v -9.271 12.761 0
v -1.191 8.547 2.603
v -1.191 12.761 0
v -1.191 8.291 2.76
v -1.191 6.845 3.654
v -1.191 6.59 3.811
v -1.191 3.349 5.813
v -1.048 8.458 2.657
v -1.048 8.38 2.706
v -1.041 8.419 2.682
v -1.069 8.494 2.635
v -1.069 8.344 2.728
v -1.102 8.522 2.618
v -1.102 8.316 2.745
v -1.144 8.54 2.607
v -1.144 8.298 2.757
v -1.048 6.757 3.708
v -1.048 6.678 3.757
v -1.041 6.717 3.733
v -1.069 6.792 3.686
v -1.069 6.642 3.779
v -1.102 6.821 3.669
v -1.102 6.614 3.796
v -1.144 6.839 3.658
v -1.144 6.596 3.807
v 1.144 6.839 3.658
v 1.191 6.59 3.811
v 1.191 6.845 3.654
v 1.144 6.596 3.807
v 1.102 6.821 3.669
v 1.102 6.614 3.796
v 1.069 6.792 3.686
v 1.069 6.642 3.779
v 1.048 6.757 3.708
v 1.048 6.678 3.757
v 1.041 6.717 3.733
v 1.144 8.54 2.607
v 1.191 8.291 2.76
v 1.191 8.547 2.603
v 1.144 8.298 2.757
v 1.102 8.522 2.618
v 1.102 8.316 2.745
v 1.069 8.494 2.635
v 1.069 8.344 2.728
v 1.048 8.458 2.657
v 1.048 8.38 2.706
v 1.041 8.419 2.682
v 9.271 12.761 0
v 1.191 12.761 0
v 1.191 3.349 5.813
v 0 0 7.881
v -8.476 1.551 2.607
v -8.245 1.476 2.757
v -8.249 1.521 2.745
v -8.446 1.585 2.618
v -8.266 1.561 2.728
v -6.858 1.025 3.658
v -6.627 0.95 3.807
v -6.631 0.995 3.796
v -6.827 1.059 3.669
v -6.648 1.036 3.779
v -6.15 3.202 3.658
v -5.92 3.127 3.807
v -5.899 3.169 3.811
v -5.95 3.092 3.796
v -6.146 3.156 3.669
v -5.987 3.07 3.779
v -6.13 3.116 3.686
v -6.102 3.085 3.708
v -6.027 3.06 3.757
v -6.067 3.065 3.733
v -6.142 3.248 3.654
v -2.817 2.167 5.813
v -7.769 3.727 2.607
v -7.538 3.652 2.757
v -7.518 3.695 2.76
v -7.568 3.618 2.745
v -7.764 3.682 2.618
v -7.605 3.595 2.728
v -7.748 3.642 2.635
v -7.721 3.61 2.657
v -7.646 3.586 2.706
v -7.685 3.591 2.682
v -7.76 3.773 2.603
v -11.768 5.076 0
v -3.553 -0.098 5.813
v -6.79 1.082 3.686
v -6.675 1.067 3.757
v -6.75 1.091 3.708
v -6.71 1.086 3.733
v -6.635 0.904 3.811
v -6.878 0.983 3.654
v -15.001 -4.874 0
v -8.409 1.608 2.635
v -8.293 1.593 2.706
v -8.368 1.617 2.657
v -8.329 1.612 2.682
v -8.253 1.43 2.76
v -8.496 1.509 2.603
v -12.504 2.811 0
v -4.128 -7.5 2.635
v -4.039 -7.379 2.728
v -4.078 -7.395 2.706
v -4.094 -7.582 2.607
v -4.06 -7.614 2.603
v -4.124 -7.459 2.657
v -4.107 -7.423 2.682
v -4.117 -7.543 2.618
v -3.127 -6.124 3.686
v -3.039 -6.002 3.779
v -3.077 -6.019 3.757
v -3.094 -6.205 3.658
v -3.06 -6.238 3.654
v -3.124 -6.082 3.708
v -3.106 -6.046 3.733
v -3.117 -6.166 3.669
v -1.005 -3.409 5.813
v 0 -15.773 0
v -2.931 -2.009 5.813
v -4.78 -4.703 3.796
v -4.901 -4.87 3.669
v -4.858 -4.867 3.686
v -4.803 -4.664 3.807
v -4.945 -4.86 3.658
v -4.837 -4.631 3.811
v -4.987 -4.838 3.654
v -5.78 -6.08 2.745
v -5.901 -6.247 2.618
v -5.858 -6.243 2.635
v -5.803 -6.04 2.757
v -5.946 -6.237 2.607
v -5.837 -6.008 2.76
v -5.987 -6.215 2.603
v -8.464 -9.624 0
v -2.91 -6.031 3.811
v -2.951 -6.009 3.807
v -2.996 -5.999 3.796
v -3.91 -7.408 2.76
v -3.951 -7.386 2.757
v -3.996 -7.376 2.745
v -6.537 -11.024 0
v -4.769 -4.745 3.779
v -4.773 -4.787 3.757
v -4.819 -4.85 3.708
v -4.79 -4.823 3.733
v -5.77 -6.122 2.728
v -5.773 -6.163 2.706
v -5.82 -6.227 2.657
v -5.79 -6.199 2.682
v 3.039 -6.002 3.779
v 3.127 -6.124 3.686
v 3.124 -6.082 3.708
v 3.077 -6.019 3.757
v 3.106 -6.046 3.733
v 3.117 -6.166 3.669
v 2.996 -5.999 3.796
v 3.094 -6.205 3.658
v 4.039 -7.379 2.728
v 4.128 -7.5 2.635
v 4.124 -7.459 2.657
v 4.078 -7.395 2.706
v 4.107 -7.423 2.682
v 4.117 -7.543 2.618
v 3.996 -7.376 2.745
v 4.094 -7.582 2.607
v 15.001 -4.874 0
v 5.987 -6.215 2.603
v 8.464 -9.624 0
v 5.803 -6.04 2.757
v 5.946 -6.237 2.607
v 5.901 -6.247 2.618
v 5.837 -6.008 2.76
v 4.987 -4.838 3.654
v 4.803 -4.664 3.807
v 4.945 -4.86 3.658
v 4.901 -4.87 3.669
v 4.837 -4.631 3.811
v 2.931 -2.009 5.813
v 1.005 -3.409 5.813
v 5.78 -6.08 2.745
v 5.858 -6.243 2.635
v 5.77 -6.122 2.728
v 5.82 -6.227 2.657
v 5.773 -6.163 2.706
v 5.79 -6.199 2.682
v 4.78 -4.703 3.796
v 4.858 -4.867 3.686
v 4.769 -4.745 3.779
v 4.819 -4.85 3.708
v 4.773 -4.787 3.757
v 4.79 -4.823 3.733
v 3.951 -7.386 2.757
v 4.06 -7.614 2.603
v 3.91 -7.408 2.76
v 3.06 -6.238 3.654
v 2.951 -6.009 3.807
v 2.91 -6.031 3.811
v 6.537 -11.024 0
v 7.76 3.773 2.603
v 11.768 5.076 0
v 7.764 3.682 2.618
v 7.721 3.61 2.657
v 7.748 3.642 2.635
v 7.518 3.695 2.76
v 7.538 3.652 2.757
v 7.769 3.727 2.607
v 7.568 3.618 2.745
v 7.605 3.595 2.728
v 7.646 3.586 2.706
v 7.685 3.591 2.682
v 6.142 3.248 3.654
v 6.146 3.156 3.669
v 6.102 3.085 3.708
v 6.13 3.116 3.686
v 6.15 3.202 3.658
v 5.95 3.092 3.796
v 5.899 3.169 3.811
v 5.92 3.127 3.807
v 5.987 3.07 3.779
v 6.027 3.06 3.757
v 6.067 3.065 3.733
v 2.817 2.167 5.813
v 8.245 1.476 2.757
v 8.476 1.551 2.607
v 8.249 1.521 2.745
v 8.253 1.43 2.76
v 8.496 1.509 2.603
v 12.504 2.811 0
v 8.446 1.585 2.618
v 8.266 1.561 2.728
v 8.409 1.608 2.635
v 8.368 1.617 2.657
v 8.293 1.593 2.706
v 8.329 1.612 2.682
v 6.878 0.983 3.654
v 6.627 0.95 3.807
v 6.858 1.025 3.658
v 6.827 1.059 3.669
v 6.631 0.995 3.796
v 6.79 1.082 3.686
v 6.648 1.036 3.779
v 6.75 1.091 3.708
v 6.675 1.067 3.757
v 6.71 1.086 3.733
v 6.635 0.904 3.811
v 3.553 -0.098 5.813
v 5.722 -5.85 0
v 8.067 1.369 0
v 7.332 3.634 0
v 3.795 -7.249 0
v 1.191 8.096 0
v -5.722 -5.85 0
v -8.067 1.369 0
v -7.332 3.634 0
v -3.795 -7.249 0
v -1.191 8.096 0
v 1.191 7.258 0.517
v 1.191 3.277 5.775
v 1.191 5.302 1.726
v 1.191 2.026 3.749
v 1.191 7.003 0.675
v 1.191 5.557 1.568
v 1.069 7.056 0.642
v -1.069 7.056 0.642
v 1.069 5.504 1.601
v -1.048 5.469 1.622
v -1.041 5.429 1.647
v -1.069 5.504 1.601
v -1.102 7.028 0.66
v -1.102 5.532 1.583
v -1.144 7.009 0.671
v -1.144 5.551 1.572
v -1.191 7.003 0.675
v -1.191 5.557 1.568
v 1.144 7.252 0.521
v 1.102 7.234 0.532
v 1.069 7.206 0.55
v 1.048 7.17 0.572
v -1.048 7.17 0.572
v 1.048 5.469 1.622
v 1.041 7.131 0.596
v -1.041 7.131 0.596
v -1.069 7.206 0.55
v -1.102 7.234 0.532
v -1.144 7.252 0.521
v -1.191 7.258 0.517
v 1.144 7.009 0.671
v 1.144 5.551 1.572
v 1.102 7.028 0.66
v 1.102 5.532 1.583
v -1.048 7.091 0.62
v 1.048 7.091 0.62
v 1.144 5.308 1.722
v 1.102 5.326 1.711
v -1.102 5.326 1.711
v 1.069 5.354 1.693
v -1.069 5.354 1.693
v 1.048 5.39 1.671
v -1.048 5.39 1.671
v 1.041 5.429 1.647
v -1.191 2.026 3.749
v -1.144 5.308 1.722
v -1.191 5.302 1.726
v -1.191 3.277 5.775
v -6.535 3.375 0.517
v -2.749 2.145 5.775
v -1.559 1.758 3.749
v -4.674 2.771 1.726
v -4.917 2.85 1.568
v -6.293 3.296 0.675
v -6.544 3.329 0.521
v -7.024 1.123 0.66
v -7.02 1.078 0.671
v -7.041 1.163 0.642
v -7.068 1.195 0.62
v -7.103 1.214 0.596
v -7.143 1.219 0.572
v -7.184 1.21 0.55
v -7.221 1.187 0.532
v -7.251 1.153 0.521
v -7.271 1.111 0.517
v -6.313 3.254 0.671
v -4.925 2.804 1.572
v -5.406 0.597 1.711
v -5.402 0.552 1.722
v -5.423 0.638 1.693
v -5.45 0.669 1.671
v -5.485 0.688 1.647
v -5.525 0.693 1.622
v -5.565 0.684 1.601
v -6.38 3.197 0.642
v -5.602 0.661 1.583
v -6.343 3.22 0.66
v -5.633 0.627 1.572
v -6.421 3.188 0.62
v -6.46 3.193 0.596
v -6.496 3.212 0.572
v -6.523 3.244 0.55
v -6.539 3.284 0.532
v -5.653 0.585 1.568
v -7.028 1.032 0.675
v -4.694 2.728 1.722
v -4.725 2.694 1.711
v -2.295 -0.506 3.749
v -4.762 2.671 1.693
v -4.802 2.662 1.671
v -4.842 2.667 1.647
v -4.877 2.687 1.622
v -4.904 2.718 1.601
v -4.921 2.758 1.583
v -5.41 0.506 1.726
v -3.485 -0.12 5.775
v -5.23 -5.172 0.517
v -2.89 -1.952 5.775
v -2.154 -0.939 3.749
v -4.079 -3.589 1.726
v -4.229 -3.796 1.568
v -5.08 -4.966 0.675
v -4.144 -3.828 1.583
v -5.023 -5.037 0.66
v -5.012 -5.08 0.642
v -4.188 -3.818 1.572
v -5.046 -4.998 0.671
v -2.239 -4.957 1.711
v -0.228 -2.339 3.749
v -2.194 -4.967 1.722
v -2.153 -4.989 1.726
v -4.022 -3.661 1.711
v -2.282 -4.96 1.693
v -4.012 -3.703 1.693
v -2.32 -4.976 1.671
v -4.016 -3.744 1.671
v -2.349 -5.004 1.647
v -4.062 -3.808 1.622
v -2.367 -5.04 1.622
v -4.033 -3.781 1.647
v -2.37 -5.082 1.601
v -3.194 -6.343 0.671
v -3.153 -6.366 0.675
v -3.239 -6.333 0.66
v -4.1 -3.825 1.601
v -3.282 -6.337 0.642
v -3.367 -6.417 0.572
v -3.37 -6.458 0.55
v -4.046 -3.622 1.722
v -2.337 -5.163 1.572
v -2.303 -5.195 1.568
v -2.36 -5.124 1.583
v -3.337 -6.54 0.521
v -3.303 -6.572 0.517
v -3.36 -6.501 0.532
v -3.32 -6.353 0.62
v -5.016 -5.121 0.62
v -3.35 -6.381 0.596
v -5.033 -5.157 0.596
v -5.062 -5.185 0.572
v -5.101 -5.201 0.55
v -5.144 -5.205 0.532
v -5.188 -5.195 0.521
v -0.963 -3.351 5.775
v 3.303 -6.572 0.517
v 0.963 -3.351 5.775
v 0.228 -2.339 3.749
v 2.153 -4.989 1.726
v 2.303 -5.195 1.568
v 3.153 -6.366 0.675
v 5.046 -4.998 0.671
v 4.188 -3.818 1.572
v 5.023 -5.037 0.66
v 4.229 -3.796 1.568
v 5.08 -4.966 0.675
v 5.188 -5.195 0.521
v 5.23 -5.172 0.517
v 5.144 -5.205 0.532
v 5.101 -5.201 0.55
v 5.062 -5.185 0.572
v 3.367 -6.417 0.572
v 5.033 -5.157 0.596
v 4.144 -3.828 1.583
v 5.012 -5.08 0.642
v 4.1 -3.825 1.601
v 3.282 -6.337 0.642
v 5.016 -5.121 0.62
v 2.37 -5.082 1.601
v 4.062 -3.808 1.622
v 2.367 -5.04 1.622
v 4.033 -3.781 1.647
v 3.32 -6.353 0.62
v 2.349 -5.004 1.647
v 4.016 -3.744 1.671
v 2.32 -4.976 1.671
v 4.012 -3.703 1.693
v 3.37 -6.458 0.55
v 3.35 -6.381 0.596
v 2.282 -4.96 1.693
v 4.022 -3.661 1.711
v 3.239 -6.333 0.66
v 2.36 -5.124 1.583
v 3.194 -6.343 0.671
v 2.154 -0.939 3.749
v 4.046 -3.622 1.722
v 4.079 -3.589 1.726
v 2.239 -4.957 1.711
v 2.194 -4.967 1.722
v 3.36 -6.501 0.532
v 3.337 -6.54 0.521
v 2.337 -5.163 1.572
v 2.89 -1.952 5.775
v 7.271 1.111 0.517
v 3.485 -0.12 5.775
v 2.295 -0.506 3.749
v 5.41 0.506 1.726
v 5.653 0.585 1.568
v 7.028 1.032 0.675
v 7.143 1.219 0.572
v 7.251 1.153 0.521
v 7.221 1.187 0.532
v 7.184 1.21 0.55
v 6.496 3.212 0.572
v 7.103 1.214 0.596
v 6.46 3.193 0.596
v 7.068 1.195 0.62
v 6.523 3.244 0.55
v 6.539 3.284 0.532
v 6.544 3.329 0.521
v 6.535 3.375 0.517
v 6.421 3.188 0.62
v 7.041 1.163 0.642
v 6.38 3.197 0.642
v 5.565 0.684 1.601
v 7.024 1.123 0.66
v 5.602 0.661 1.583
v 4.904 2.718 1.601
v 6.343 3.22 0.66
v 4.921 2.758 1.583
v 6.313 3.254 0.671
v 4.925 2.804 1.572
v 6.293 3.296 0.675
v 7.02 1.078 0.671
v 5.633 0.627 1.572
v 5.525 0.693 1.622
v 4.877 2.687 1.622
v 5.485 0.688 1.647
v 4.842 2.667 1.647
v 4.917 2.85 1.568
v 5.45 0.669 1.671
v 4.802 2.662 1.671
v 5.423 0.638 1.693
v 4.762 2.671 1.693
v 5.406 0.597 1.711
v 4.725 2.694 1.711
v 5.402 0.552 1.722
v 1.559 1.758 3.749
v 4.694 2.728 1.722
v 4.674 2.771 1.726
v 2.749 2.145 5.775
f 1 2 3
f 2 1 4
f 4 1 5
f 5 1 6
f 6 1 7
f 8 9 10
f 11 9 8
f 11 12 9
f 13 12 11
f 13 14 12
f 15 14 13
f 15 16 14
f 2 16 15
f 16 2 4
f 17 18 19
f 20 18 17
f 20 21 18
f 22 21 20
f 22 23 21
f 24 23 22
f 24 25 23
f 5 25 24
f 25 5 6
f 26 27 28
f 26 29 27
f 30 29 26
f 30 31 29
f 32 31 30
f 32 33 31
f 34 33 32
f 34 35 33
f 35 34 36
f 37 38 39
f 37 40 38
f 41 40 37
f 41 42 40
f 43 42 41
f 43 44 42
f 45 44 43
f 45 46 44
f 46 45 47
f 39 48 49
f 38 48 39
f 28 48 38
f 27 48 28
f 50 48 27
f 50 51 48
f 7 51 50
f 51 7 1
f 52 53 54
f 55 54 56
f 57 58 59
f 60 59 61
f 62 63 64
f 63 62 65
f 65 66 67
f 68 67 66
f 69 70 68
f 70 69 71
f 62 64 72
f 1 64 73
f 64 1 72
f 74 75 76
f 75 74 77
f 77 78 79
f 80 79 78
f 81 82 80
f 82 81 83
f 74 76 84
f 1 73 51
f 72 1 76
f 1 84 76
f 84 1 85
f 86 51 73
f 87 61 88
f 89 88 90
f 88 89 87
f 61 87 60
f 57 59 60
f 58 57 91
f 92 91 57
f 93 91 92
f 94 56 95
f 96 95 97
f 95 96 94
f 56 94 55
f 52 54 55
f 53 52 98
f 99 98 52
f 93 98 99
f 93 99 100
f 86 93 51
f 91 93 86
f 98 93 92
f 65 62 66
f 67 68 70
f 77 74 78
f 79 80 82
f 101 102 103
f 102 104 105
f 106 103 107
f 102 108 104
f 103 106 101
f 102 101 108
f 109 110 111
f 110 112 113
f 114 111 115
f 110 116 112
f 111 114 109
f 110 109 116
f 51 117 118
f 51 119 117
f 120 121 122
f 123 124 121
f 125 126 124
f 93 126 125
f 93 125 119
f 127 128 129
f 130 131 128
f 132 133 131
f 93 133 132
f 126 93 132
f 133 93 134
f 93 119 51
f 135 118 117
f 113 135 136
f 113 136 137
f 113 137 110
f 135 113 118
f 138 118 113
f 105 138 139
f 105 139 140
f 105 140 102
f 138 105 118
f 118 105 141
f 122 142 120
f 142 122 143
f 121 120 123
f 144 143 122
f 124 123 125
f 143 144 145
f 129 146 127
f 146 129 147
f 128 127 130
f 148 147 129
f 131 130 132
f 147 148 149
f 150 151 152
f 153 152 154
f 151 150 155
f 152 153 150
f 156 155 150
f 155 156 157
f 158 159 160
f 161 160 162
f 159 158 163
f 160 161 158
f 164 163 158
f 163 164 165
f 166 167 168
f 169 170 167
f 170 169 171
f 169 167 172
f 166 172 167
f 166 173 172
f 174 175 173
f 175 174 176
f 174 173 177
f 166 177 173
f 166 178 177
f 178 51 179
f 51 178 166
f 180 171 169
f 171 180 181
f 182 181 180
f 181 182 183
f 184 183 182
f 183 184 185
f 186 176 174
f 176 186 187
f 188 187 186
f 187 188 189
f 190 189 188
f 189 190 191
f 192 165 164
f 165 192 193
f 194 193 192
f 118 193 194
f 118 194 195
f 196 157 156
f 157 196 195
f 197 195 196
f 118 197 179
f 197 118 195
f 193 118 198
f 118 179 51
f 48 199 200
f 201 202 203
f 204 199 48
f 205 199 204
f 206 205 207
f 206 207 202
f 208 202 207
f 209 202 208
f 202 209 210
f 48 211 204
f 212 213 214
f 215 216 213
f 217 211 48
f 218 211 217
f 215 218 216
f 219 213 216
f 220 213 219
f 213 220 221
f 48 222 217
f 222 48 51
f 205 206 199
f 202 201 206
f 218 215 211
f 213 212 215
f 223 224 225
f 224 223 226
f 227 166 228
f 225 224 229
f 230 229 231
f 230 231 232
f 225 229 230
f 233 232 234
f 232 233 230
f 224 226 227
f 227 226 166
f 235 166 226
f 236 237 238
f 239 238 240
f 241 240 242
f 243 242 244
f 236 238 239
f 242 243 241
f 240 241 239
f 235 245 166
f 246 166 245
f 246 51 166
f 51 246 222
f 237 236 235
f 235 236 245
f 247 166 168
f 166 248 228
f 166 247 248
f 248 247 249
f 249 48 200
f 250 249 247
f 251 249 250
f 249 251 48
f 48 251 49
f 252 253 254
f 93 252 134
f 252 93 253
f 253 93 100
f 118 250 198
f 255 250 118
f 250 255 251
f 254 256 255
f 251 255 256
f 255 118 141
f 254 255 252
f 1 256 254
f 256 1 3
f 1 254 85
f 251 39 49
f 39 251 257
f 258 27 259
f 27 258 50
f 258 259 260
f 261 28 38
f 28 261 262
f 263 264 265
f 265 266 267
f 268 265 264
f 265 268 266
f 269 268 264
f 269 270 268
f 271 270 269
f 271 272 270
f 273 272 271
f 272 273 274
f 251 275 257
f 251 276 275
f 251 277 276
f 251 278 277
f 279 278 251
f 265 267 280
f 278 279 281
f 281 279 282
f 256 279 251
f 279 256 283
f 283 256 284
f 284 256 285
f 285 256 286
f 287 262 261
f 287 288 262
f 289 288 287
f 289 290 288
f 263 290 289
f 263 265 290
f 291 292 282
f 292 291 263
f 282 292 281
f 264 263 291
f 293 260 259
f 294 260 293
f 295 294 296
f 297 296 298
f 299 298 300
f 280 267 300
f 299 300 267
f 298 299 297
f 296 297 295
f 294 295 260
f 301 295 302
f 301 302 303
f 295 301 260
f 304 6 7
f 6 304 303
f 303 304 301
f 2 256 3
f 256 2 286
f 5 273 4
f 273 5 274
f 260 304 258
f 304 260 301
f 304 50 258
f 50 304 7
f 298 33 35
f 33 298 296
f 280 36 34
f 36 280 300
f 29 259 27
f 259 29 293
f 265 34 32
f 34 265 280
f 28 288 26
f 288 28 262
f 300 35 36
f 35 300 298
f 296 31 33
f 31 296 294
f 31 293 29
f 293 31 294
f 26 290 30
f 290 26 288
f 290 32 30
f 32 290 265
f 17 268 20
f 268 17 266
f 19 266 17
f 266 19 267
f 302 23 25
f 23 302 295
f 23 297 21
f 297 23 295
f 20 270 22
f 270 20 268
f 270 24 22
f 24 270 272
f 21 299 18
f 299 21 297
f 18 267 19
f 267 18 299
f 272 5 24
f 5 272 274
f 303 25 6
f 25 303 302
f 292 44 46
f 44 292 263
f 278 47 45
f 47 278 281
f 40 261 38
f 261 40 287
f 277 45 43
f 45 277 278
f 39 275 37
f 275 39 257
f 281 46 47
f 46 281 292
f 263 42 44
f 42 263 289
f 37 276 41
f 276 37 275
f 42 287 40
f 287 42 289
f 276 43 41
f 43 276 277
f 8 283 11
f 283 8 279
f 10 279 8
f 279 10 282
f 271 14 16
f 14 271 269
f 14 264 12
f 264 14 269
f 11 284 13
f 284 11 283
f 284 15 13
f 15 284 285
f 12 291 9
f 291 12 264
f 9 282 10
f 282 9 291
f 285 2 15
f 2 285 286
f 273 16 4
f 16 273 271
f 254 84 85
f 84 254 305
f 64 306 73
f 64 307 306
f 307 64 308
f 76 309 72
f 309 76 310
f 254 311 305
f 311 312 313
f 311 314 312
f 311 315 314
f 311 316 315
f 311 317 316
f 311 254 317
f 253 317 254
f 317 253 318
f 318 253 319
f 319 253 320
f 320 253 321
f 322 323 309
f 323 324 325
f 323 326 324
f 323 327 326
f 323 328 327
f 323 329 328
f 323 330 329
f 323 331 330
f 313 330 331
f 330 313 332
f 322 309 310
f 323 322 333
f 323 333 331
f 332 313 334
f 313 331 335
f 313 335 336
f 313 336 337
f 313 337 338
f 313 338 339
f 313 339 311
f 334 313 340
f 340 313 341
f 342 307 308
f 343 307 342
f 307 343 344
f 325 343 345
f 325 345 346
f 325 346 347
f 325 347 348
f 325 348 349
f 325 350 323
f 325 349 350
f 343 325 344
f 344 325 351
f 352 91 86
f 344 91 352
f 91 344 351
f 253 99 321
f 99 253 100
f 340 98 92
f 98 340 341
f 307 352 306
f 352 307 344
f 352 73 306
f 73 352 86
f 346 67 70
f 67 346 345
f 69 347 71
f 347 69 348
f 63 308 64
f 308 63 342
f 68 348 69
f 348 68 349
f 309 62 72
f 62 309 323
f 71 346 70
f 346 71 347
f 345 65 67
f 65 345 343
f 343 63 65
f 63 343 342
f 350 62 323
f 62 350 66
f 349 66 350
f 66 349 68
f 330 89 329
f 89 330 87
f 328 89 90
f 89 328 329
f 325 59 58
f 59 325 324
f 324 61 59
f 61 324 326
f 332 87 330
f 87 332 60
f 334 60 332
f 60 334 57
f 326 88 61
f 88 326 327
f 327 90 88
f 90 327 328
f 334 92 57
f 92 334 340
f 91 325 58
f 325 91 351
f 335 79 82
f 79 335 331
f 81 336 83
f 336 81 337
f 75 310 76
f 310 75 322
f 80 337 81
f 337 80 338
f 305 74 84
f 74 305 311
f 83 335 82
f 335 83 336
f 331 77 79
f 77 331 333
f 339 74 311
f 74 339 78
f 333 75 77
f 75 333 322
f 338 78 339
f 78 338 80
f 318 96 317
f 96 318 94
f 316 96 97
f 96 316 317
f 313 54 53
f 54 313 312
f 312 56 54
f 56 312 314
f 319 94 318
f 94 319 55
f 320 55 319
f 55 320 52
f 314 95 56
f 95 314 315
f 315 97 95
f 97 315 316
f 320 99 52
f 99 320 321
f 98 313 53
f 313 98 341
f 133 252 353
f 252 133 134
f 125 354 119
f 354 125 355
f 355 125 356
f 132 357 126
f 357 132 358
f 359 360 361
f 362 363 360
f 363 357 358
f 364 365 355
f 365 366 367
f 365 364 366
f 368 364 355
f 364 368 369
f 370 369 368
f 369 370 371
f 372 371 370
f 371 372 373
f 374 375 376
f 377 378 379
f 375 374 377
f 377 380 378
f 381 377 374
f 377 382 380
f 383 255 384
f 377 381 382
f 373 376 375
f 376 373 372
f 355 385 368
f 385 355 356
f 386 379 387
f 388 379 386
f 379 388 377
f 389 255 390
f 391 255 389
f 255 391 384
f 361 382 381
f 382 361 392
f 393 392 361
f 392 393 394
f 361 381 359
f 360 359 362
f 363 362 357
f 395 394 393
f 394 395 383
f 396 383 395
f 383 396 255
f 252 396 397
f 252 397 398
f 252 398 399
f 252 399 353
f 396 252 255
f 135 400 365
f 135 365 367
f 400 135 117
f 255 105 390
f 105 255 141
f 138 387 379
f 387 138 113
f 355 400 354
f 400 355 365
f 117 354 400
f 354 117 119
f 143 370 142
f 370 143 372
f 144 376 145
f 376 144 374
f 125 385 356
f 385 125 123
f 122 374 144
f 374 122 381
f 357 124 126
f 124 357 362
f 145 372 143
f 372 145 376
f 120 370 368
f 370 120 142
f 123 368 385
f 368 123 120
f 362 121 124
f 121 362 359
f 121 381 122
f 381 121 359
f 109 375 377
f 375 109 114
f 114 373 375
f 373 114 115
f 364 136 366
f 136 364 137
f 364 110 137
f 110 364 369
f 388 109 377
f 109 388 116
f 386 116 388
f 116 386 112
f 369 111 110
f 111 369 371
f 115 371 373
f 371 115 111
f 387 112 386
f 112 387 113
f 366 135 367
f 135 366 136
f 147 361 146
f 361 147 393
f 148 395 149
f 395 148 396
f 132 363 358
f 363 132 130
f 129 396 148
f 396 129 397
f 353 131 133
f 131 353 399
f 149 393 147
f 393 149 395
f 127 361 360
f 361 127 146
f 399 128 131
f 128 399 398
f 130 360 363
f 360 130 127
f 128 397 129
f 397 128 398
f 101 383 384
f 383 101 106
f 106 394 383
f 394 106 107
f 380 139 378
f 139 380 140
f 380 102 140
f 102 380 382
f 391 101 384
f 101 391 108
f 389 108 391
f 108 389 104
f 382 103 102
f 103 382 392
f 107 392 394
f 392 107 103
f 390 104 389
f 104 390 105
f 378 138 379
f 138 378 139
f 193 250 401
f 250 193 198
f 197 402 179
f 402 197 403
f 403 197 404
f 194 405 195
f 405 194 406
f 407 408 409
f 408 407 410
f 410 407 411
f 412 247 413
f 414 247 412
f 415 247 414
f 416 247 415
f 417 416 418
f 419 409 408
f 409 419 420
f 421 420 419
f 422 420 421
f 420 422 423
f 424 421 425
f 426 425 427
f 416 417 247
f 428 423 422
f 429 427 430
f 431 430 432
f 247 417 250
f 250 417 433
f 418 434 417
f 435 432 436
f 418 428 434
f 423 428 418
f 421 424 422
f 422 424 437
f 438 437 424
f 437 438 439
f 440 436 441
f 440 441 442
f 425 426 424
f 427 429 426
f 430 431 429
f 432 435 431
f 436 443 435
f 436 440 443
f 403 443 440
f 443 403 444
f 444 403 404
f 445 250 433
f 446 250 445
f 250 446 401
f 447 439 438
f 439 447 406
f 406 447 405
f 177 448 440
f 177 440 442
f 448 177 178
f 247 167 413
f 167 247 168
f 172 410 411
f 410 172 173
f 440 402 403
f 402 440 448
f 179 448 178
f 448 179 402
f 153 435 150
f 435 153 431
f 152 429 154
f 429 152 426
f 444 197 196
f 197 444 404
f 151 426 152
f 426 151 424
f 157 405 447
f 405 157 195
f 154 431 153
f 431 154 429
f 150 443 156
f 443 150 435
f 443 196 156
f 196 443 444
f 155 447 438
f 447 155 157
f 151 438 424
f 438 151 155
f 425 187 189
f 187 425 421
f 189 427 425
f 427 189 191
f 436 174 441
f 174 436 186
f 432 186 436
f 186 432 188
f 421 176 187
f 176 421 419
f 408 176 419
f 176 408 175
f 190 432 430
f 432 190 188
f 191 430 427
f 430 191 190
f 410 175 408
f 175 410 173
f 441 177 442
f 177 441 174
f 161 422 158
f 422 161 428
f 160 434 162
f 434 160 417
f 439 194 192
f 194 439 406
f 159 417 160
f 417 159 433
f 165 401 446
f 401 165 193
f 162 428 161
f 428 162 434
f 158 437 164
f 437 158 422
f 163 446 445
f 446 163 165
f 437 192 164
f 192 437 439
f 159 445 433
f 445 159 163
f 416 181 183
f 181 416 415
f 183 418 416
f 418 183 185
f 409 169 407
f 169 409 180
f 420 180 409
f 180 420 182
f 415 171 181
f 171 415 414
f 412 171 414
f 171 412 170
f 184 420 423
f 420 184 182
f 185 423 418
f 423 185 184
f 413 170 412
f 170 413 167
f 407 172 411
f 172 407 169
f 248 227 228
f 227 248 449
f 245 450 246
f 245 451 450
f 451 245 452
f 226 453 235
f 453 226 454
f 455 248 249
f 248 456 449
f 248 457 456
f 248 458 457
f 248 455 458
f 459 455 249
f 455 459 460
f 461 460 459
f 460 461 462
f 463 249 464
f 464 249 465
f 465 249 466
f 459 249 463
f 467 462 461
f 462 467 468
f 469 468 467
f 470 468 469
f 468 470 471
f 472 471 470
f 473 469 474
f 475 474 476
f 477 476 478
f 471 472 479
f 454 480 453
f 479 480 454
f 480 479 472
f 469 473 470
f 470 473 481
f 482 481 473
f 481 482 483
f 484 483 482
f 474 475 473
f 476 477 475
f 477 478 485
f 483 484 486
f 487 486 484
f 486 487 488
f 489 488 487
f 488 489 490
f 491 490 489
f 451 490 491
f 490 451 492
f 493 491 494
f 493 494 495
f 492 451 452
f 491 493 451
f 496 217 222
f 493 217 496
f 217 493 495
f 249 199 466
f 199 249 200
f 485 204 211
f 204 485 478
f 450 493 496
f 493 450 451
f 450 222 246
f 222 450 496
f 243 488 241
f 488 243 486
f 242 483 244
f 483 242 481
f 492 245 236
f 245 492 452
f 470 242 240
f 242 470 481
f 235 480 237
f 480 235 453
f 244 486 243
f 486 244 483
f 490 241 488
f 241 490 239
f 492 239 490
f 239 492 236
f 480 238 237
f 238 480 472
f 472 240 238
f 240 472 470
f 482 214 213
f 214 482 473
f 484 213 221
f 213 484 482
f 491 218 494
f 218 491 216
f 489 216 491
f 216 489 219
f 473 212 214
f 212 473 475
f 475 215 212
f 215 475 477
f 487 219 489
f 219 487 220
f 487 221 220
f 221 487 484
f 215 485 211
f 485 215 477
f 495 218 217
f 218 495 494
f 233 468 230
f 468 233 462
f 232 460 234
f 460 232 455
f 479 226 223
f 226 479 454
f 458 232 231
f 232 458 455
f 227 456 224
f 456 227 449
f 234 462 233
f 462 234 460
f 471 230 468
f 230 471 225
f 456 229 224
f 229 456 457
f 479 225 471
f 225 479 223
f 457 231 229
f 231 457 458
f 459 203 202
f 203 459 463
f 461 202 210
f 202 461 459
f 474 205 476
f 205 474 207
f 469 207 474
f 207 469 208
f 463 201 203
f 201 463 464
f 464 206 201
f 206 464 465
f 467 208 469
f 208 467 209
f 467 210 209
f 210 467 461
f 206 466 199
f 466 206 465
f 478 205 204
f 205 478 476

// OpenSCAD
// We'll use celestial notation. All angles are in degrees.
azimuth = 72;
altitude = -31.7;

// Assuming the member has a square cross section, one
// dimension in mm.
member_w = 2.38125; // 3/32"
peg_d = 0.3;
module member_slot_neg() {
    difference() {
        intersection() {
            translate([-member_w/2,0,0])
            cube(size=[member_w,100,member_w*2]);
            translate([0,0,member_w])
            rotate(-30, v=[1,0,0])
            translate([-member_w,0,-50])
            cube(size=[member_w*2,100,100]);
        }
        for (y = [4, 6]) for (xf = [1, -1])
            translate([xf*member_w/2,y,0])
            cylinder(h=member_w*5,d=peg_d,center=true,$fn=20);
    }
}

module connector(azimuth,altitude) {
    difference() {
        intersection() {
            translate([-50,-50,0])
            cube([100,100,100]);
            translate([0,0,5.5+member_w])
            intersection_for (az = [0 : azimuth : 359] ) {
                rotate(az)
                rotate(altitude,v=[1,0,0])
                translate([-30,-30,-60])
                cube([60,60,60]);
            }
        }
        for (az = [0 : azimuth : 359]) {
            translate([0,0,5])
            rotate(az)
            rotate(altitude,v=[1,0,0])
            translate([0,member_w,0])
            member_slot_neg();
        }
    }
}

connector(azimuth,altitude);
